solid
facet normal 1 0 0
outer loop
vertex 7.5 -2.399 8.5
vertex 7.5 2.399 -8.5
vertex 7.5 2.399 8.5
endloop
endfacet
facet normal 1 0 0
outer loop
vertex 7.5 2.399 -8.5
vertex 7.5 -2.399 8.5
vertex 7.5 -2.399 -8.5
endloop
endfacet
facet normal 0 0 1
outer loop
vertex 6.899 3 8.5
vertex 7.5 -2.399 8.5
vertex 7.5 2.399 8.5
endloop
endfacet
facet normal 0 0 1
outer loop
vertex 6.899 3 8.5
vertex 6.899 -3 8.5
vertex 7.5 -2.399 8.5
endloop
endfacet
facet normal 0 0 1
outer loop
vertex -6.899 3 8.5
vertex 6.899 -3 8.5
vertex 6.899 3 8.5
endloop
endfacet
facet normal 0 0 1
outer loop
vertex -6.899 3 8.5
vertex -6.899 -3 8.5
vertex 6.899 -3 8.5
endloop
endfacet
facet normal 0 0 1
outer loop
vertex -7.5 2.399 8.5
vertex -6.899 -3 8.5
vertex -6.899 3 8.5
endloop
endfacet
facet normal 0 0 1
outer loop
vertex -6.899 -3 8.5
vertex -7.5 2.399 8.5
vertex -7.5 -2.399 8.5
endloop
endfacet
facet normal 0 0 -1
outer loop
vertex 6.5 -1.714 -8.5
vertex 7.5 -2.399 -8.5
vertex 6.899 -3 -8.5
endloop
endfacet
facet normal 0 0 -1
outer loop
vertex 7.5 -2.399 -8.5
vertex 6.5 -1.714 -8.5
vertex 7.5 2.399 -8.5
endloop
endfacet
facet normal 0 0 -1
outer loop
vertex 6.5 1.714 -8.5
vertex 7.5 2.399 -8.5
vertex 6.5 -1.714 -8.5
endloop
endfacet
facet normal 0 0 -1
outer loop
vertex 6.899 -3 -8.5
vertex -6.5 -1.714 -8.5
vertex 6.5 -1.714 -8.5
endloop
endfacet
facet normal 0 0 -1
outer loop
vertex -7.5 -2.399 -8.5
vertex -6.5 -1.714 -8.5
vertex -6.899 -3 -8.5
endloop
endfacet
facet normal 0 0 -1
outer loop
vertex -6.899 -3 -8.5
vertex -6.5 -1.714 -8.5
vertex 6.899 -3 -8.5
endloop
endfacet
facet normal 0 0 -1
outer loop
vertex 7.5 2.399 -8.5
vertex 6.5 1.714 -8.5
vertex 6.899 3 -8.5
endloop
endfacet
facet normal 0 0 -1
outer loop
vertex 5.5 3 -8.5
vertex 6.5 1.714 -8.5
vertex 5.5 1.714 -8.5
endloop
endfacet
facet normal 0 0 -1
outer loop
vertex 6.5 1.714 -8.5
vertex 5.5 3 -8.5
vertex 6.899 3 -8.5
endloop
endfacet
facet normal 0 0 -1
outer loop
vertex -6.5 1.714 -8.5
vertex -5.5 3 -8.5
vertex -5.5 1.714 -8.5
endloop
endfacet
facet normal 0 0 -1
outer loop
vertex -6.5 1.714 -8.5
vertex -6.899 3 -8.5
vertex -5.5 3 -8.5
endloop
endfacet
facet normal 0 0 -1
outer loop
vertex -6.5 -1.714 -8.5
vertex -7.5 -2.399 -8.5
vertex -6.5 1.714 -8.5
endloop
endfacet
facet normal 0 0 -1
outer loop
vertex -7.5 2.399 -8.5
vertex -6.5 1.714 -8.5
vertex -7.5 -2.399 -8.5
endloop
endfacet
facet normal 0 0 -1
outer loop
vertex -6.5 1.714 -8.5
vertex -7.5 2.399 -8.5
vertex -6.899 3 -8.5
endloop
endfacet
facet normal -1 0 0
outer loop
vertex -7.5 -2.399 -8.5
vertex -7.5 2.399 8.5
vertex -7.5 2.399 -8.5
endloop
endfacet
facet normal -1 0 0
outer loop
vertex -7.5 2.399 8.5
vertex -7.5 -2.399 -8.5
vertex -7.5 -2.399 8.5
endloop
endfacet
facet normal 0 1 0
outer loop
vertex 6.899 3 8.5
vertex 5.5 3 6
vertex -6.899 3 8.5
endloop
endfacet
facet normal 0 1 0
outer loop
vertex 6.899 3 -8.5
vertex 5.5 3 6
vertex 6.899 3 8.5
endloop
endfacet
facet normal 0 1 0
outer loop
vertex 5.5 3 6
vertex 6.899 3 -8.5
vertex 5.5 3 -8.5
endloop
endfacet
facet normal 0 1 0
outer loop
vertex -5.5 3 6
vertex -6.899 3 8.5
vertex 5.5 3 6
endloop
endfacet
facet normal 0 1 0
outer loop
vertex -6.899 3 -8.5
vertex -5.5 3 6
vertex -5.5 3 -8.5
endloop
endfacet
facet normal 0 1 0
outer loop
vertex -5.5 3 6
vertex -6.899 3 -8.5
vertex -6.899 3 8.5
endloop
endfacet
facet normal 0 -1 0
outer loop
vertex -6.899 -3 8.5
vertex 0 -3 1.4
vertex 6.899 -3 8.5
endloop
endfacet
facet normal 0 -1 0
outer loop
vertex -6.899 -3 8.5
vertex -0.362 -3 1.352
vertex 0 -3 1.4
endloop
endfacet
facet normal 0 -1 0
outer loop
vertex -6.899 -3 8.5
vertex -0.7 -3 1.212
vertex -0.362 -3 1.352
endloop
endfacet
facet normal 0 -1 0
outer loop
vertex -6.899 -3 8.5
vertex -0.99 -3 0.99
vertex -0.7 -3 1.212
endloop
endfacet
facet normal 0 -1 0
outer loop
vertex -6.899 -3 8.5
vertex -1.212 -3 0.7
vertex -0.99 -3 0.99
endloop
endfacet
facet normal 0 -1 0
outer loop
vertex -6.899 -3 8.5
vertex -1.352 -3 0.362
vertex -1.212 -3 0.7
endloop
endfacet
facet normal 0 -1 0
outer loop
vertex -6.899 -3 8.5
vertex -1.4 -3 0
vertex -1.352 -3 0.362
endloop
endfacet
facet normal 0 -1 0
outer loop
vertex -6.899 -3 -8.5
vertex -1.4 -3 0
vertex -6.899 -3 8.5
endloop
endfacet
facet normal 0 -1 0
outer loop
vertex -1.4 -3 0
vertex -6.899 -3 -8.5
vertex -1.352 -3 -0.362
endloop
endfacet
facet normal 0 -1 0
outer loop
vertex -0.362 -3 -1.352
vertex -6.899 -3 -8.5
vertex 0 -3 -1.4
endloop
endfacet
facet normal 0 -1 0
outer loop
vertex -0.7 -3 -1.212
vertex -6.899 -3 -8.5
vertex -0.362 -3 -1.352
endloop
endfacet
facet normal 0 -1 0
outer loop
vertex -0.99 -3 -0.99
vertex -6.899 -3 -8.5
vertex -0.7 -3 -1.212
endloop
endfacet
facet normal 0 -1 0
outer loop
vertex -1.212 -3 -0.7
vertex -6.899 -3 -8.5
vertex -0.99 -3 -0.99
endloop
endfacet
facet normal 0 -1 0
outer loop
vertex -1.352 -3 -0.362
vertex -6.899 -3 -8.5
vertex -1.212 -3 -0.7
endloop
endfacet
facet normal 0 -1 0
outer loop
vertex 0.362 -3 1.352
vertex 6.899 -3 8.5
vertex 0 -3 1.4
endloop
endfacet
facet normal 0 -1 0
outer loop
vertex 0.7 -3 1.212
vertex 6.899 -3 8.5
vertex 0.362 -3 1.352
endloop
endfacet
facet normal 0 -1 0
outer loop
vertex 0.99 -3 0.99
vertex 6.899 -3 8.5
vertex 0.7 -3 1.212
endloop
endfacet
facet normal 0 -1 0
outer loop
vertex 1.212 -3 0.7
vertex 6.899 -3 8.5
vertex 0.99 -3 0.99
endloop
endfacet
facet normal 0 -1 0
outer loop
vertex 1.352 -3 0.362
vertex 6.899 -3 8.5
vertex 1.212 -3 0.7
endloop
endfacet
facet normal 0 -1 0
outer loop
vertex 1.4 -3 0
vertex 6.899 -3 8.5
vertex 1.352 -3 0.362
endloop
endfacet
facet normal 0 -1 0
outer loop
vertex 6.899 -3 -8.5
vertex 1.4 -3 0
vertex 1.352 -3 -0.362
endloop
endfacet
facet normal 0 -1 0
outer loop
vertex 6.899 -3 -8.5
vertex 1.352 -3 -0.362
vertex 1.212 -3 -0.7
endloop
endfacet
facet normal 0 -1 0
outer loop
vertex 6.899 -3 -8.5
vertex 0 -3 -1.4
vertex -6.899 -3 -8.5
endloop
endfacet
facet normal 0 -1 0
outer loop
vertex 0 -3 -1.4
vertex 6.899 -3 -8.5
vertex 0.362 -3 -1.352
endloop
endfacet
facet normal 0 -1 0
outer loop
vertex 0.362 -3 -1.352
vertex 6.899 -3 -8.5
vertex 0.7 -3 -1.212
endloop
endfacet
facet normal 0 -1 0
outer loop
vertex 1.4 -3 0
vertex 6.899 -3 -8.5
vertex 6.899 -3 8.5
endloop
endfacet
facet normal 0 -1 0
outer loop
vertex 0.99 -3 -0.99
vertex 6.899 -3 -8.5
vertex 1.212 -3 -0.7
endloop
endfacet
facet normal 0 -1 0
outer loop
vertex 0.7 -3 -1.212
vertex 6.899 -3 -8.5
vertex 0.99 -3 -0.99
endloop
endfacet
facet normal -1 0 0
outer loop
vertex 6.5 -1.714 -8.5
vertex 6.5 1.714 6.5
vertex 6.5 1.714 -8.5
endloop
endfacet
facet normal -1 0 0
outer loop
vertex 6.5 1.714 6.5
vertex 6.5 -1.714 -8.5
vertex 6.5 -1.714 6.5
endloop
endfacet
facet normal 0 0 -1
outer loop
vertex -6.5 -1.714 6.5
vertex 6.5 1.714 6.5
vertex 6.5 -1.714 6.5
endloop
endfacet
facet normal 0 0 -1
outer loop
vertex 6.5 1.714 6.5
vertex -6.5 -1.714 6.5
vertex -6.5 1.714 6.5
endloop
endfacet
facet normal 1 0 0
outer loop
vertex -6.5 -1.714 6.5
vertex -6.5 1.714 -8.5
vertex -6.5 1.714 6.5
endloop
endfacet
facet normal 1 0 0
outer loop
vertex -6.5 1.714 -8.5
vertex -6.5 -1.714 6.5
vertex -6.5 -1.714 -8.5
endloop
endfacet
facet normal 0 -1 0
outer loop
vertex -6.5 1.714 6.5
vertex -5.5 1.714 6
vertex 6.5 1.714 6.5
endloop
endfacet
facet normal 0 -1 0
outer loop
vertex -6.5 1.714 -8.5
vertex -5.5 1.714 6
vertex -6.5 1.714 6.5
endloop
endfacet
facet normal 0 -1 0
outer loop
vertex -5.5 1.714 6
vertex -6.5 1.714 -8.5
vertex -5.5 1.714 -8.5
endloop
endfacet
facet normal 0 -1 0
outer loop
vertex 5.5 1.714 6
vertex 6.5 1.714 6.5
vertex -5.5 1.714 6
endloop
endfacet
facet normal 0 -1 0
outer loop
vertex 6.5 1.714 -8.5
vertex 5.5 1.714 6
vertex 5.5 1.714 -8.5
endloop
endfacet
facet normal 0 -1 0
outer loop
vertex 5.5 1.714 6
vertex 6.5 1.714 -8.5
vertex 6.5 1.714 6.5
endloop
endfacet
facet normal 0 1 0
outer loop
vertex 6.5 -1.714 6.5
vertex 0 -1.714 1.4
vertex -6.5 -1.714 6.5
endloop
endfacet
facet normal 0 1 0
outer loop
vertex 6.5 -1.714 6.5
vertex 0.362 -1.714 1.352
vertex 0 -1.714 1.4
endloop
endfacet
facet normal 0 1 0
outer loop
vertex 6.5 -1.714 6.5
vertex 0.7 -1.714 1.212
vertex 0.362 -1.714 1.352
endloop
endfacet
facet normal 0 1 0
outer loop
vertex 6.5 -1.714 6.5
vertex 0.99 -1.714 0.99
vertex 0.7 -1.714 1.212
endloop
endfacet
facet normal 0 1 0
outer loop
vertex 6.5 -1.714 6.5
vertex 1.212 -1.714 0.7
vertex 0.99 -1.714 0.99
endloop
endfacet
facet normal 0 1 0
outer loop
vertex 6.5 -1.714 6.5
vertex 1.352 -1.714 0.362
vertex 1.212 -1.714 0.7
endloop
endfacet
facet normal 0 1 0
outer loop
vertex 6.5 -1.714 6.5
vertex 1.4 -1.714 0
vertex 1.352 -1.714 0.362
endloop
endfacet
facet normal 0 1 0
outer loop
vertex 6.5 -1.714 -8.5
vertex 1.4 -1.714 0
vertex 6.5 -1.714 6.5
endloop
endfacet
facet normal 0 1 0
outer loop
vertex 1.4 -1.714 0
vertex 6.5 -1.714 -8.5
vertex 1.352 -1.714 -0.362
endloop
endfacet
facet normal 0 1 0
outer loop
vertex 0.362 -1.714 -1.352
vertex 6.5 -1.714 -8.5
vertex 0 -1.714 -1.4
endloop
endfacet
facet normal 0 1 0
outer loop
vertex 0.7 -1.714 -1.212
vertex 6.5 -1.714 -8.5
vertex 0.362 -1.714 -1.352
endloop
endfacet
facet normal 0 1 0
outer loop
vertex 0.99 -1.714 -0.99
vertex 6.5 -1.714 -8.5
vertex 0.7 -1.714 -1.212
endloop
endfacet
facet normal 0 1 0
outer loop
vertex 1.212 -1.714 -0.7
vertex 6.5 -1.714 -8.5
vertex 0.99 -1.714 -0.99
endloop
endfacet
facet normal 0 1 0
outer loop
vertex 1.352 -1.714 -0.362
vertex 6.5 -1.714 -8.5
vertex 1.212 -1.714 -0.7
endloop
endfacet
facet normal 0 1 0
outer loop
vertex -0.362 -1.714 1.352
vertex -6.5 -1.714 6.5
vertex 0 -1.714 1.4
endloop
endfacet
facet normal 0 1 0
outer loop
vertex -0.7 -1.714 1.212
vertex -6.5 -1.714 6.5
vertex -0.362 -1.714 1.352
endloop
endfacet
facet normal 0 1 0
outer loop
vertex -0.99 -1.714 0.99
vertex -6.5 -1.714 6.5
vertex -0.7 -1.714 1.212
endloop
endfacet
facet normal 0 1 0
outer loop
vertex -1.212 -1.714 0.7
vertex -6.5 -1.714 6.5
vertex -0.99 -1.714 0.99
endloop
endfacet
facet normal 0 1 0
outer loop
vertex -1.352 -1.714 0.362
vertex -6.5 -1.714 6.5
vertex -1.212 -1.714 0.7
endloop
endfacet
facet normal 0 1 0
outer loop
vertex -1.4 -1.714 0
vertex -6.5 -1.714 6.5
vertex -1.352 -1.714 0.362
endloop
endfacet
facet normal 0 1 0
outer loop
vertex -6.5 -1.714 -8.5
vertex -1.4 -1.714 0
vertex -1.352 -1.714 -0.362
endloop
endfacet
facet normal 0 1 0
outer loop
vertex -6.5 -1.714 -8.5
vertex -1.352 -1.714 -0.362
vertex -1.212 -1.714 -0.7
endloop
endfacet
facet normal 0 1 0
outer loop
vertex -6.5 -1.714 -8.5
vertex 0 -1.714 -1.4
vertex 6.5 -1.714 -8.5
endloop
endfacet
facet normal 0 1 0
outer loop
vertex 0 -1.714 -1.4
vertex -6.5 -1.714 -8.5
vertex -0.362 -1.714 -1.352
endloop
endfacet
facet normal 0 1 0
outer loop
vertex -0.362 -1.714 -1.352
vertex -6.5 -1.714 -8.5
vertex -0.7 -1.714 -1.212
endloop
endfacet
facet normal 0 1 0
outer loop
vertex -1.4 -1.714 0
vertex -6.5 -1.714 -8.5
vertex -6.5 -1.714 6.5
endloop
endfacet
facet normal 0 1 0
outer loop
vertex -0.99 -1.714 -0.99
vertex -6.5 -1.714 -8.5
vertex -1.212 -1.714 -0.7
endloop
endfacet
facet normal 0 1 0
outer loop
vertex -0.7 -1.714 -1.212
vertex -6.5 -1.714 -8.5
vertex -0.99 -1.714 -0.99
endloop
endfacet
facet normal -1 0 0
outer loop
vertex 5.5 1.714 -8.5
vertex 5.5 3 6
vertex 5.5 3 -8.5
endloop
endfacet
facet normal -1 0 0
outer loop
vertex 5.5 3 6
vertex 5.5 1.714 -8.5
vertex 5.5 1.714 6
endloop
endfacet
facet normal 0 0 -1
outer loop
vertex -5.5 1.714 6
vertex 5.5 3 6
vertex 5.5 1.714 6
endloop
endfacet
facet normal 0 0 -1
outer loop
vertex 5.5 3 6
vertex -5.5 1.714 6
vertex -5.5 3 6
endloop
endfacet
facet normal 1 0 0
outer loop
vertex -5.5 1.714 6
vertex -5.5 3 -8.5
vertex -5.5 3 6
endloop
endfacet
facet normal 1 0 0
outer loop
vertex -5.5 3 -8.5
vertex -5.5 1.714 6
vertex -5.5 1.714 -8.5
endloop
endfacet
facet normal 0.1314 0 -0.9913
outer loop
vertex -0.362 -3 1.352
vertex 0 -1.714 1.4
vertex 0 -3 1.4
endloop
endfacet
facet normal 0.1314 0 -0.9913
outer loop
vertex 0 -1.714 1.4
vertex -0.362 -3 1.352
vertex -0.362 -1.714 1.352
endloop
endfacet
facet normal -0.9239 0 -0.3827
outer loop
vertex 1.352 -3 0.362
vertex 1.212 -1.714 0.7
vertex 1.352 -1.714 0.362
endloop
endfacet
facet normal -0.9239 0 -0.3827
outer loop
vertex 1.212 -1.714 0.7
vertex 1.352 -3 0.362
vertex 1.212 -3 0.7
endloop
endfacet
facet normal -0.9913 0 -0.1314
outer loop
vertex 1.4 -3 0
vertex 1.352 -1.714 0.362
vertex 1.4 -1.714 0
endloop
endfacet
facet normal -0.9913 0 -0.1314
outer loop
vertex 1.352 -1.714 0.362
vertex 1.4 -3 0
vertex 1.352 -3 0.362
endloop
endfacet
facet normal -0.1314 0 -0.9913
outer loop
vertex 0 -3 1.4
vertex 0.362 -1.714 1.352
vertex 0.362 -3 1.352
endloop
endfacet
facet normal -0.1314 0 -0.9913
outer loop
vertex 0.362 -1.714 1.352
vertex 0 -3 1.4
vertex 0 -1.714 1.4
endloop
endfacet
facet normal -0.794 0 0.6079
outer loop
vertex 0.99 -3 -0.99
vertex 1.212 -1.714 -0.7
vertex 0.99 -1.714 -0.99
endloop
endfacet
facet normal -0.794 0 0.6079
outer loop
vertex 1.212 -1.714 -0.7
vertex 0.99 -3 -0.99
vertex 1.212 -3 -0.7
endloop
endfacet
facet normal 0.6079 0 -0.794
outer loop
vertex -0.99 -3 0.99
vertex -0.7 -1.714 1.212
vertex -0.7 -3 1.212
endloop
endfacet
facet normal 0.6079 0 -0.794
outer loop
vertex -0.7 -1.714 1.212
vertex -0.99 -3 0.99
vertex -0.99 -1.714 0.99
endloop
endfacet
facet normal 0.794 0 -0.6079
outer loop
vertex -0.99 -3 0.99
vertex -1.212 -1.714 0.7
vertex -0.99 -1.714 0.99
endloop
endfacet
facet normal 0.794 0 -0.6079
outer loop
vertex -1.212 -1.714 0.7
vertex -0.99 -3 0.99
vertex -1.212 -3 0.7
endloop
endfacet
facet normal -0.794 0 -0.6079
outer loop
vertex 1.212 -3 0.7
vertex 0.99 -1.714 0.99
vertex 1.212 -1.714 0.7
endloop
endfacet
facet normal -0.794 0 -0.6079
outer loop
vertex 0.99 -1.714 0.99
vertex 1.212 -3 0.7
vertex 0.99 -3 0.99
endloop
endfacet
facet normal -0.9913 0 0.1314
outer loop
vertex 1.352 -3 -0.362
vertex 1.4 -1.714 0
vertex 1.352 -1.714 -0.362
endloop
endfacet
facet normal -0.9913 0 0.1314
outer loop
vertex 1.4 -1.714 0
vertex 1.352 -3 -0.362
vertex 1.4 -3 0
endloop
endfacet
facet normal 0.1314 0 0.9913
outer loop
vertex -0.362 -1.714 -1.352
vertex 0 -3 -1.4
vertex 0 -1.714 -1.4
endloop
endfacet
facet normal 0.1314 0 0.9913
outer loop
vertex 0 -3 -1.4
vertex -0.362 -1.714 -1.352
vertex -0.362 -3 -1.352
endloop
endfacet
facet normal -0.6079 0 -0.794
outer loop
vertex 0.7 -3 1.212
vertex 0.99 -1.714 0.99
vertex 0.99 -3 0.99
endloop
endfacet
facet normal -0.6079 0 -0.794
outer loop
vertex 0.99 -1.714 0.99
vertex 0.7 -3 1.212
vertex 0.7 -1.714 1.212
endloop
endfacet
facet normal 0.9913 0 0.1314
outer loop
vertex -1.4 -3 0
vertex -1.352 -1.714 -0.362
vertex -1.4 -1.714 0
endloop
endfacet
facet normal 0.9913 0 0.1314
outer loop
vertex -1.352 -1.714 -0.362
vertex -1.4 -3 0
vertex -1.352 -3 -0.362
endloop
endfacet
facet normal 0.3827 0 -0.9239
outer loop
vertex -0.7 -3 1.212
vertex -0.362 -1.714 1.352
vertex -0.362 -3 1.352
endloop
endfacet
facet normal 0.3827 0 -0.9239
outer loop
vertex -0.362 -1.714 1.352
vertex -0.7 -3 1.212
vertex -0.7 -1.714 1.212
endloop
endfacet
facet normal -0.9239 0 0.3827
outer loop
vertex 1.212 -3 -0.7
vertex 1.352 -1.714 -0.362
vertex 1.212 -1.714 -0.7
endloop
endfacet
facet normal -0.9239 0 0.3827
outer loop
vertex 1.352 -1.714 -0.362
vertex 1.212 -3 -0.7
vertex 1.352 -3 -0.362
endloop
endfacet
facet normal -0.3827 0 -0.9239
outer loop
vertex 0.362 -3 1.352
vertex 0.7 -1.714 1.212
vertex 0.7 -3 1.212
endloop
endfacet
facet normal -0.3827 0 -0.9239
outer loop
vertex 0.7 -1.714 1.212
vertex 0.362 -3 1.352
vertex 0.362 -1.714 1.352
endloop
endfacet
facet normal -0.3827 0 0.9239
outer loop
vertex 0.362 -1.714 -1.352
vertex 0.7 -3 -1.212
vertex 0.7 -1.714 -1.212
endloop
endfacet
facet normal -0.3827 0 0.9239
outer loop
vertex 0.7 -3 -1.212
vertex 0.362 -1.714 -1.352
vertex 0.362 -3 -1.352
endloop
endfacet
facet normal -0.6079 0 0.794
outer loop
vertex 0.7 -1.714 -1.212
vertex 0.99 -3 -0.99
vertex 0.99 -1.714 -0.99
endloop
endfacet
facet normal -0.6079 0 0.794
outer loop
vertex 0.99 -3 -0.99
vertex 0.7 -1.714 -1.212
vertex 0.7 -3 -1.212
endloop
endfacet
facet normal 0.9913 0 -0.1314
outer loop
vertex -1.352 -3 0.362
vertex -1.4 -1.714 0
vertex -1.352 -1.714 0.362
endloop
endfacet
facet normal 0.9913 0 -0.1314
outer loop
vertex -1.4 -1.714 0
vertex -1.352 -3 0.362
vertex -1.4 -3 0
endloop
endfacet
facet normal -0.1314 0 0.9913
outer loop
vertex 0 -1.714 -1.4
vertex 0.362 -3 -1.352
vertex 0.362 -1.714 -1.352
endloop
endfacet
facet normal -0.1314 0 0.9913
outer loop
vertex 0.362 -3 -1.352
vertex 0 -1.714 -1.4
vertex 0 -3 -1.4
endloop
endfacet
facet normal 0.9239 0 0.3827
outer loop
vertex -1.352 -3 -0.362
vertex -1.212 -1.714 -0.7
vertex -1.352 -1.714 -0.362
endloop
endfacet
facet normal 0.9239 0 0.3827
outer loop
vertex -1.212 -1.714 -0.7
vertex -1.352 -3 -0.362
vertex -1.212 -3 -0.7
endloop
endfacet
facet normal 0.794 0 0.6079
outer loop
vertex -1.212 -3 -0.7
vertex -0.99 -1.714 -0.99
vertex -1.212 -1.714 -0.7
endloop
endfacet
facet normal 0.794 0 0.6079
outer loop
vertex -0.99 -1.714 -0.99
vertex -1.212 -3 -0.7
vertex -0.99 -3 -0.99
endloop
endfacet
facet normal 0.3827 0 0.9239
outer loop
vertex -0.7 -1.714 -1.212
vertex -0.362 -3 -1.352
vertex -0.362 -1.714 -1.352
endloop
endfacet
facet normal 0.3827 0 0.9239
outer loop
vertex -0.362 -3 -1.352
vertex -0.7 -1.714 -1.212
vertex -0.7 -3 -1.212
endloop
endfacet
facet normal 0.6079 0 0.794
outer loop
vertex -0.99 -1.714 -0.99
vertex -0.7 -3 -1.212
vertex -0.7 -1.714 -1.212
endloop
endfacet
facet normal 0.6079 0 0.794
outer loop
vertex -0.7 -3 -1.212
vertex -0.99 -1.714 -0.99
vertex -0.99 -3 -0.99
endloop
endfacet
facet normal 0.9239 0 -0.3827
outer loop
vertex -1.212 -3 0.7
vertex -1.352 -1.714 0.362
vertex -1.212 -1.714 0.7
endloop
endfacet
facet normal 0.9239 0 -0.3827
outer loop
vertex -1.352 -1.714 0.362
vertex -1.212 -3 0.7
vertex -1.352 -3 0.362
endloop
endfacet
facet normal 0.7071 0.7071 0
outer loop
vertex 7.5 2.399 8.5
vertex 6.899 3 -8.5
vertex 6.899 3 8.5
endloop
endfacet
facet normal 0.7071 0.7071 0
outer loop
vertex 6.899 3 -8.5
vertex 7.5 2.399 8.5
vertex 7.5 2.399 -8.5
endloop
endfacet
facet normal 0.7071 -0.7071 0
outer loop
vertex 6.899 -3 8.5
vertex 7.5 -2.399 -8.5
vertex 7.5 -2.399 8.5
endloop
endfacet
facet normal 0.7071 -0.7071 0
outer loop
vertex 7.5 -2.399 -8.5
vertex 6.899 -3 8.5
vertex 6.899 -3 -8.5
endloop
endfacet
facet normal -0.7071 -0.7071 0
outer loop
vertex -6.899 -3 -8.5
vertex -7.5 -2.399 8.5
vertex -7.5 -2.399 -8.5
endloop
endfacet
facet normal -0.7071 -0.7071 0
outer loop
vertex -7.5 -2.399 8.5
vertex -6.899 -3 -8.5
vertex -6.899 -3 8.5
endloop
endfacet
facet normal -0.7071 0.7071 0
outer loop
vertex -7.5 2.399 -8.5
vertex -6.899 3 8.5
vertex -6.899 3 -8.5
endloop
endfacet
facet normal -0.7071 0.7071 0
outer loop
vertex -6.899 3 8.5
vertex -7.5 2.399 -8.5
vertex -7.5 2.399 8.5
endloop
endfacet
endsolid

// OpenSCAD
module clip(lgt,wid,hgt,rad) 
{
    difference() {
        cube([lgt,wid,hgt],center=true);
        translate([0,0,-2])
           cube([lgt-2,4*wid/7,hgt],center=true);
                translate([0,2,-2])
           cube([lgt-4,wid,hgt-1],center=true);
        rotate([90,0,0])
           cylinder(r=rad,h=2*wid,center=true,$fn=24);
   
    rotate([0,0,-45])
       translate([lgt/4,4*wid/3,0])
       cube([lgt/4,wid/3,hgt+2],center=true);
        rotate([0,0,45])
       translate([lgt/4,-4*wid/3,0])
       cube([lgt/4,wid/3,hgt+2],center=true);
        rotate([0,0,-45])
       translate([-lgt/4,-4*wid/3,0])
       cube([lgt/4,wid/3,hgt+2],center=true);
            rotate([0,0,45])
       translate([-lgt/4,4*wid/3,0])
       cube([lgt/4,wid/3,hgt+2],center=true);
    }
}
clip(15,6,17,1.4);
